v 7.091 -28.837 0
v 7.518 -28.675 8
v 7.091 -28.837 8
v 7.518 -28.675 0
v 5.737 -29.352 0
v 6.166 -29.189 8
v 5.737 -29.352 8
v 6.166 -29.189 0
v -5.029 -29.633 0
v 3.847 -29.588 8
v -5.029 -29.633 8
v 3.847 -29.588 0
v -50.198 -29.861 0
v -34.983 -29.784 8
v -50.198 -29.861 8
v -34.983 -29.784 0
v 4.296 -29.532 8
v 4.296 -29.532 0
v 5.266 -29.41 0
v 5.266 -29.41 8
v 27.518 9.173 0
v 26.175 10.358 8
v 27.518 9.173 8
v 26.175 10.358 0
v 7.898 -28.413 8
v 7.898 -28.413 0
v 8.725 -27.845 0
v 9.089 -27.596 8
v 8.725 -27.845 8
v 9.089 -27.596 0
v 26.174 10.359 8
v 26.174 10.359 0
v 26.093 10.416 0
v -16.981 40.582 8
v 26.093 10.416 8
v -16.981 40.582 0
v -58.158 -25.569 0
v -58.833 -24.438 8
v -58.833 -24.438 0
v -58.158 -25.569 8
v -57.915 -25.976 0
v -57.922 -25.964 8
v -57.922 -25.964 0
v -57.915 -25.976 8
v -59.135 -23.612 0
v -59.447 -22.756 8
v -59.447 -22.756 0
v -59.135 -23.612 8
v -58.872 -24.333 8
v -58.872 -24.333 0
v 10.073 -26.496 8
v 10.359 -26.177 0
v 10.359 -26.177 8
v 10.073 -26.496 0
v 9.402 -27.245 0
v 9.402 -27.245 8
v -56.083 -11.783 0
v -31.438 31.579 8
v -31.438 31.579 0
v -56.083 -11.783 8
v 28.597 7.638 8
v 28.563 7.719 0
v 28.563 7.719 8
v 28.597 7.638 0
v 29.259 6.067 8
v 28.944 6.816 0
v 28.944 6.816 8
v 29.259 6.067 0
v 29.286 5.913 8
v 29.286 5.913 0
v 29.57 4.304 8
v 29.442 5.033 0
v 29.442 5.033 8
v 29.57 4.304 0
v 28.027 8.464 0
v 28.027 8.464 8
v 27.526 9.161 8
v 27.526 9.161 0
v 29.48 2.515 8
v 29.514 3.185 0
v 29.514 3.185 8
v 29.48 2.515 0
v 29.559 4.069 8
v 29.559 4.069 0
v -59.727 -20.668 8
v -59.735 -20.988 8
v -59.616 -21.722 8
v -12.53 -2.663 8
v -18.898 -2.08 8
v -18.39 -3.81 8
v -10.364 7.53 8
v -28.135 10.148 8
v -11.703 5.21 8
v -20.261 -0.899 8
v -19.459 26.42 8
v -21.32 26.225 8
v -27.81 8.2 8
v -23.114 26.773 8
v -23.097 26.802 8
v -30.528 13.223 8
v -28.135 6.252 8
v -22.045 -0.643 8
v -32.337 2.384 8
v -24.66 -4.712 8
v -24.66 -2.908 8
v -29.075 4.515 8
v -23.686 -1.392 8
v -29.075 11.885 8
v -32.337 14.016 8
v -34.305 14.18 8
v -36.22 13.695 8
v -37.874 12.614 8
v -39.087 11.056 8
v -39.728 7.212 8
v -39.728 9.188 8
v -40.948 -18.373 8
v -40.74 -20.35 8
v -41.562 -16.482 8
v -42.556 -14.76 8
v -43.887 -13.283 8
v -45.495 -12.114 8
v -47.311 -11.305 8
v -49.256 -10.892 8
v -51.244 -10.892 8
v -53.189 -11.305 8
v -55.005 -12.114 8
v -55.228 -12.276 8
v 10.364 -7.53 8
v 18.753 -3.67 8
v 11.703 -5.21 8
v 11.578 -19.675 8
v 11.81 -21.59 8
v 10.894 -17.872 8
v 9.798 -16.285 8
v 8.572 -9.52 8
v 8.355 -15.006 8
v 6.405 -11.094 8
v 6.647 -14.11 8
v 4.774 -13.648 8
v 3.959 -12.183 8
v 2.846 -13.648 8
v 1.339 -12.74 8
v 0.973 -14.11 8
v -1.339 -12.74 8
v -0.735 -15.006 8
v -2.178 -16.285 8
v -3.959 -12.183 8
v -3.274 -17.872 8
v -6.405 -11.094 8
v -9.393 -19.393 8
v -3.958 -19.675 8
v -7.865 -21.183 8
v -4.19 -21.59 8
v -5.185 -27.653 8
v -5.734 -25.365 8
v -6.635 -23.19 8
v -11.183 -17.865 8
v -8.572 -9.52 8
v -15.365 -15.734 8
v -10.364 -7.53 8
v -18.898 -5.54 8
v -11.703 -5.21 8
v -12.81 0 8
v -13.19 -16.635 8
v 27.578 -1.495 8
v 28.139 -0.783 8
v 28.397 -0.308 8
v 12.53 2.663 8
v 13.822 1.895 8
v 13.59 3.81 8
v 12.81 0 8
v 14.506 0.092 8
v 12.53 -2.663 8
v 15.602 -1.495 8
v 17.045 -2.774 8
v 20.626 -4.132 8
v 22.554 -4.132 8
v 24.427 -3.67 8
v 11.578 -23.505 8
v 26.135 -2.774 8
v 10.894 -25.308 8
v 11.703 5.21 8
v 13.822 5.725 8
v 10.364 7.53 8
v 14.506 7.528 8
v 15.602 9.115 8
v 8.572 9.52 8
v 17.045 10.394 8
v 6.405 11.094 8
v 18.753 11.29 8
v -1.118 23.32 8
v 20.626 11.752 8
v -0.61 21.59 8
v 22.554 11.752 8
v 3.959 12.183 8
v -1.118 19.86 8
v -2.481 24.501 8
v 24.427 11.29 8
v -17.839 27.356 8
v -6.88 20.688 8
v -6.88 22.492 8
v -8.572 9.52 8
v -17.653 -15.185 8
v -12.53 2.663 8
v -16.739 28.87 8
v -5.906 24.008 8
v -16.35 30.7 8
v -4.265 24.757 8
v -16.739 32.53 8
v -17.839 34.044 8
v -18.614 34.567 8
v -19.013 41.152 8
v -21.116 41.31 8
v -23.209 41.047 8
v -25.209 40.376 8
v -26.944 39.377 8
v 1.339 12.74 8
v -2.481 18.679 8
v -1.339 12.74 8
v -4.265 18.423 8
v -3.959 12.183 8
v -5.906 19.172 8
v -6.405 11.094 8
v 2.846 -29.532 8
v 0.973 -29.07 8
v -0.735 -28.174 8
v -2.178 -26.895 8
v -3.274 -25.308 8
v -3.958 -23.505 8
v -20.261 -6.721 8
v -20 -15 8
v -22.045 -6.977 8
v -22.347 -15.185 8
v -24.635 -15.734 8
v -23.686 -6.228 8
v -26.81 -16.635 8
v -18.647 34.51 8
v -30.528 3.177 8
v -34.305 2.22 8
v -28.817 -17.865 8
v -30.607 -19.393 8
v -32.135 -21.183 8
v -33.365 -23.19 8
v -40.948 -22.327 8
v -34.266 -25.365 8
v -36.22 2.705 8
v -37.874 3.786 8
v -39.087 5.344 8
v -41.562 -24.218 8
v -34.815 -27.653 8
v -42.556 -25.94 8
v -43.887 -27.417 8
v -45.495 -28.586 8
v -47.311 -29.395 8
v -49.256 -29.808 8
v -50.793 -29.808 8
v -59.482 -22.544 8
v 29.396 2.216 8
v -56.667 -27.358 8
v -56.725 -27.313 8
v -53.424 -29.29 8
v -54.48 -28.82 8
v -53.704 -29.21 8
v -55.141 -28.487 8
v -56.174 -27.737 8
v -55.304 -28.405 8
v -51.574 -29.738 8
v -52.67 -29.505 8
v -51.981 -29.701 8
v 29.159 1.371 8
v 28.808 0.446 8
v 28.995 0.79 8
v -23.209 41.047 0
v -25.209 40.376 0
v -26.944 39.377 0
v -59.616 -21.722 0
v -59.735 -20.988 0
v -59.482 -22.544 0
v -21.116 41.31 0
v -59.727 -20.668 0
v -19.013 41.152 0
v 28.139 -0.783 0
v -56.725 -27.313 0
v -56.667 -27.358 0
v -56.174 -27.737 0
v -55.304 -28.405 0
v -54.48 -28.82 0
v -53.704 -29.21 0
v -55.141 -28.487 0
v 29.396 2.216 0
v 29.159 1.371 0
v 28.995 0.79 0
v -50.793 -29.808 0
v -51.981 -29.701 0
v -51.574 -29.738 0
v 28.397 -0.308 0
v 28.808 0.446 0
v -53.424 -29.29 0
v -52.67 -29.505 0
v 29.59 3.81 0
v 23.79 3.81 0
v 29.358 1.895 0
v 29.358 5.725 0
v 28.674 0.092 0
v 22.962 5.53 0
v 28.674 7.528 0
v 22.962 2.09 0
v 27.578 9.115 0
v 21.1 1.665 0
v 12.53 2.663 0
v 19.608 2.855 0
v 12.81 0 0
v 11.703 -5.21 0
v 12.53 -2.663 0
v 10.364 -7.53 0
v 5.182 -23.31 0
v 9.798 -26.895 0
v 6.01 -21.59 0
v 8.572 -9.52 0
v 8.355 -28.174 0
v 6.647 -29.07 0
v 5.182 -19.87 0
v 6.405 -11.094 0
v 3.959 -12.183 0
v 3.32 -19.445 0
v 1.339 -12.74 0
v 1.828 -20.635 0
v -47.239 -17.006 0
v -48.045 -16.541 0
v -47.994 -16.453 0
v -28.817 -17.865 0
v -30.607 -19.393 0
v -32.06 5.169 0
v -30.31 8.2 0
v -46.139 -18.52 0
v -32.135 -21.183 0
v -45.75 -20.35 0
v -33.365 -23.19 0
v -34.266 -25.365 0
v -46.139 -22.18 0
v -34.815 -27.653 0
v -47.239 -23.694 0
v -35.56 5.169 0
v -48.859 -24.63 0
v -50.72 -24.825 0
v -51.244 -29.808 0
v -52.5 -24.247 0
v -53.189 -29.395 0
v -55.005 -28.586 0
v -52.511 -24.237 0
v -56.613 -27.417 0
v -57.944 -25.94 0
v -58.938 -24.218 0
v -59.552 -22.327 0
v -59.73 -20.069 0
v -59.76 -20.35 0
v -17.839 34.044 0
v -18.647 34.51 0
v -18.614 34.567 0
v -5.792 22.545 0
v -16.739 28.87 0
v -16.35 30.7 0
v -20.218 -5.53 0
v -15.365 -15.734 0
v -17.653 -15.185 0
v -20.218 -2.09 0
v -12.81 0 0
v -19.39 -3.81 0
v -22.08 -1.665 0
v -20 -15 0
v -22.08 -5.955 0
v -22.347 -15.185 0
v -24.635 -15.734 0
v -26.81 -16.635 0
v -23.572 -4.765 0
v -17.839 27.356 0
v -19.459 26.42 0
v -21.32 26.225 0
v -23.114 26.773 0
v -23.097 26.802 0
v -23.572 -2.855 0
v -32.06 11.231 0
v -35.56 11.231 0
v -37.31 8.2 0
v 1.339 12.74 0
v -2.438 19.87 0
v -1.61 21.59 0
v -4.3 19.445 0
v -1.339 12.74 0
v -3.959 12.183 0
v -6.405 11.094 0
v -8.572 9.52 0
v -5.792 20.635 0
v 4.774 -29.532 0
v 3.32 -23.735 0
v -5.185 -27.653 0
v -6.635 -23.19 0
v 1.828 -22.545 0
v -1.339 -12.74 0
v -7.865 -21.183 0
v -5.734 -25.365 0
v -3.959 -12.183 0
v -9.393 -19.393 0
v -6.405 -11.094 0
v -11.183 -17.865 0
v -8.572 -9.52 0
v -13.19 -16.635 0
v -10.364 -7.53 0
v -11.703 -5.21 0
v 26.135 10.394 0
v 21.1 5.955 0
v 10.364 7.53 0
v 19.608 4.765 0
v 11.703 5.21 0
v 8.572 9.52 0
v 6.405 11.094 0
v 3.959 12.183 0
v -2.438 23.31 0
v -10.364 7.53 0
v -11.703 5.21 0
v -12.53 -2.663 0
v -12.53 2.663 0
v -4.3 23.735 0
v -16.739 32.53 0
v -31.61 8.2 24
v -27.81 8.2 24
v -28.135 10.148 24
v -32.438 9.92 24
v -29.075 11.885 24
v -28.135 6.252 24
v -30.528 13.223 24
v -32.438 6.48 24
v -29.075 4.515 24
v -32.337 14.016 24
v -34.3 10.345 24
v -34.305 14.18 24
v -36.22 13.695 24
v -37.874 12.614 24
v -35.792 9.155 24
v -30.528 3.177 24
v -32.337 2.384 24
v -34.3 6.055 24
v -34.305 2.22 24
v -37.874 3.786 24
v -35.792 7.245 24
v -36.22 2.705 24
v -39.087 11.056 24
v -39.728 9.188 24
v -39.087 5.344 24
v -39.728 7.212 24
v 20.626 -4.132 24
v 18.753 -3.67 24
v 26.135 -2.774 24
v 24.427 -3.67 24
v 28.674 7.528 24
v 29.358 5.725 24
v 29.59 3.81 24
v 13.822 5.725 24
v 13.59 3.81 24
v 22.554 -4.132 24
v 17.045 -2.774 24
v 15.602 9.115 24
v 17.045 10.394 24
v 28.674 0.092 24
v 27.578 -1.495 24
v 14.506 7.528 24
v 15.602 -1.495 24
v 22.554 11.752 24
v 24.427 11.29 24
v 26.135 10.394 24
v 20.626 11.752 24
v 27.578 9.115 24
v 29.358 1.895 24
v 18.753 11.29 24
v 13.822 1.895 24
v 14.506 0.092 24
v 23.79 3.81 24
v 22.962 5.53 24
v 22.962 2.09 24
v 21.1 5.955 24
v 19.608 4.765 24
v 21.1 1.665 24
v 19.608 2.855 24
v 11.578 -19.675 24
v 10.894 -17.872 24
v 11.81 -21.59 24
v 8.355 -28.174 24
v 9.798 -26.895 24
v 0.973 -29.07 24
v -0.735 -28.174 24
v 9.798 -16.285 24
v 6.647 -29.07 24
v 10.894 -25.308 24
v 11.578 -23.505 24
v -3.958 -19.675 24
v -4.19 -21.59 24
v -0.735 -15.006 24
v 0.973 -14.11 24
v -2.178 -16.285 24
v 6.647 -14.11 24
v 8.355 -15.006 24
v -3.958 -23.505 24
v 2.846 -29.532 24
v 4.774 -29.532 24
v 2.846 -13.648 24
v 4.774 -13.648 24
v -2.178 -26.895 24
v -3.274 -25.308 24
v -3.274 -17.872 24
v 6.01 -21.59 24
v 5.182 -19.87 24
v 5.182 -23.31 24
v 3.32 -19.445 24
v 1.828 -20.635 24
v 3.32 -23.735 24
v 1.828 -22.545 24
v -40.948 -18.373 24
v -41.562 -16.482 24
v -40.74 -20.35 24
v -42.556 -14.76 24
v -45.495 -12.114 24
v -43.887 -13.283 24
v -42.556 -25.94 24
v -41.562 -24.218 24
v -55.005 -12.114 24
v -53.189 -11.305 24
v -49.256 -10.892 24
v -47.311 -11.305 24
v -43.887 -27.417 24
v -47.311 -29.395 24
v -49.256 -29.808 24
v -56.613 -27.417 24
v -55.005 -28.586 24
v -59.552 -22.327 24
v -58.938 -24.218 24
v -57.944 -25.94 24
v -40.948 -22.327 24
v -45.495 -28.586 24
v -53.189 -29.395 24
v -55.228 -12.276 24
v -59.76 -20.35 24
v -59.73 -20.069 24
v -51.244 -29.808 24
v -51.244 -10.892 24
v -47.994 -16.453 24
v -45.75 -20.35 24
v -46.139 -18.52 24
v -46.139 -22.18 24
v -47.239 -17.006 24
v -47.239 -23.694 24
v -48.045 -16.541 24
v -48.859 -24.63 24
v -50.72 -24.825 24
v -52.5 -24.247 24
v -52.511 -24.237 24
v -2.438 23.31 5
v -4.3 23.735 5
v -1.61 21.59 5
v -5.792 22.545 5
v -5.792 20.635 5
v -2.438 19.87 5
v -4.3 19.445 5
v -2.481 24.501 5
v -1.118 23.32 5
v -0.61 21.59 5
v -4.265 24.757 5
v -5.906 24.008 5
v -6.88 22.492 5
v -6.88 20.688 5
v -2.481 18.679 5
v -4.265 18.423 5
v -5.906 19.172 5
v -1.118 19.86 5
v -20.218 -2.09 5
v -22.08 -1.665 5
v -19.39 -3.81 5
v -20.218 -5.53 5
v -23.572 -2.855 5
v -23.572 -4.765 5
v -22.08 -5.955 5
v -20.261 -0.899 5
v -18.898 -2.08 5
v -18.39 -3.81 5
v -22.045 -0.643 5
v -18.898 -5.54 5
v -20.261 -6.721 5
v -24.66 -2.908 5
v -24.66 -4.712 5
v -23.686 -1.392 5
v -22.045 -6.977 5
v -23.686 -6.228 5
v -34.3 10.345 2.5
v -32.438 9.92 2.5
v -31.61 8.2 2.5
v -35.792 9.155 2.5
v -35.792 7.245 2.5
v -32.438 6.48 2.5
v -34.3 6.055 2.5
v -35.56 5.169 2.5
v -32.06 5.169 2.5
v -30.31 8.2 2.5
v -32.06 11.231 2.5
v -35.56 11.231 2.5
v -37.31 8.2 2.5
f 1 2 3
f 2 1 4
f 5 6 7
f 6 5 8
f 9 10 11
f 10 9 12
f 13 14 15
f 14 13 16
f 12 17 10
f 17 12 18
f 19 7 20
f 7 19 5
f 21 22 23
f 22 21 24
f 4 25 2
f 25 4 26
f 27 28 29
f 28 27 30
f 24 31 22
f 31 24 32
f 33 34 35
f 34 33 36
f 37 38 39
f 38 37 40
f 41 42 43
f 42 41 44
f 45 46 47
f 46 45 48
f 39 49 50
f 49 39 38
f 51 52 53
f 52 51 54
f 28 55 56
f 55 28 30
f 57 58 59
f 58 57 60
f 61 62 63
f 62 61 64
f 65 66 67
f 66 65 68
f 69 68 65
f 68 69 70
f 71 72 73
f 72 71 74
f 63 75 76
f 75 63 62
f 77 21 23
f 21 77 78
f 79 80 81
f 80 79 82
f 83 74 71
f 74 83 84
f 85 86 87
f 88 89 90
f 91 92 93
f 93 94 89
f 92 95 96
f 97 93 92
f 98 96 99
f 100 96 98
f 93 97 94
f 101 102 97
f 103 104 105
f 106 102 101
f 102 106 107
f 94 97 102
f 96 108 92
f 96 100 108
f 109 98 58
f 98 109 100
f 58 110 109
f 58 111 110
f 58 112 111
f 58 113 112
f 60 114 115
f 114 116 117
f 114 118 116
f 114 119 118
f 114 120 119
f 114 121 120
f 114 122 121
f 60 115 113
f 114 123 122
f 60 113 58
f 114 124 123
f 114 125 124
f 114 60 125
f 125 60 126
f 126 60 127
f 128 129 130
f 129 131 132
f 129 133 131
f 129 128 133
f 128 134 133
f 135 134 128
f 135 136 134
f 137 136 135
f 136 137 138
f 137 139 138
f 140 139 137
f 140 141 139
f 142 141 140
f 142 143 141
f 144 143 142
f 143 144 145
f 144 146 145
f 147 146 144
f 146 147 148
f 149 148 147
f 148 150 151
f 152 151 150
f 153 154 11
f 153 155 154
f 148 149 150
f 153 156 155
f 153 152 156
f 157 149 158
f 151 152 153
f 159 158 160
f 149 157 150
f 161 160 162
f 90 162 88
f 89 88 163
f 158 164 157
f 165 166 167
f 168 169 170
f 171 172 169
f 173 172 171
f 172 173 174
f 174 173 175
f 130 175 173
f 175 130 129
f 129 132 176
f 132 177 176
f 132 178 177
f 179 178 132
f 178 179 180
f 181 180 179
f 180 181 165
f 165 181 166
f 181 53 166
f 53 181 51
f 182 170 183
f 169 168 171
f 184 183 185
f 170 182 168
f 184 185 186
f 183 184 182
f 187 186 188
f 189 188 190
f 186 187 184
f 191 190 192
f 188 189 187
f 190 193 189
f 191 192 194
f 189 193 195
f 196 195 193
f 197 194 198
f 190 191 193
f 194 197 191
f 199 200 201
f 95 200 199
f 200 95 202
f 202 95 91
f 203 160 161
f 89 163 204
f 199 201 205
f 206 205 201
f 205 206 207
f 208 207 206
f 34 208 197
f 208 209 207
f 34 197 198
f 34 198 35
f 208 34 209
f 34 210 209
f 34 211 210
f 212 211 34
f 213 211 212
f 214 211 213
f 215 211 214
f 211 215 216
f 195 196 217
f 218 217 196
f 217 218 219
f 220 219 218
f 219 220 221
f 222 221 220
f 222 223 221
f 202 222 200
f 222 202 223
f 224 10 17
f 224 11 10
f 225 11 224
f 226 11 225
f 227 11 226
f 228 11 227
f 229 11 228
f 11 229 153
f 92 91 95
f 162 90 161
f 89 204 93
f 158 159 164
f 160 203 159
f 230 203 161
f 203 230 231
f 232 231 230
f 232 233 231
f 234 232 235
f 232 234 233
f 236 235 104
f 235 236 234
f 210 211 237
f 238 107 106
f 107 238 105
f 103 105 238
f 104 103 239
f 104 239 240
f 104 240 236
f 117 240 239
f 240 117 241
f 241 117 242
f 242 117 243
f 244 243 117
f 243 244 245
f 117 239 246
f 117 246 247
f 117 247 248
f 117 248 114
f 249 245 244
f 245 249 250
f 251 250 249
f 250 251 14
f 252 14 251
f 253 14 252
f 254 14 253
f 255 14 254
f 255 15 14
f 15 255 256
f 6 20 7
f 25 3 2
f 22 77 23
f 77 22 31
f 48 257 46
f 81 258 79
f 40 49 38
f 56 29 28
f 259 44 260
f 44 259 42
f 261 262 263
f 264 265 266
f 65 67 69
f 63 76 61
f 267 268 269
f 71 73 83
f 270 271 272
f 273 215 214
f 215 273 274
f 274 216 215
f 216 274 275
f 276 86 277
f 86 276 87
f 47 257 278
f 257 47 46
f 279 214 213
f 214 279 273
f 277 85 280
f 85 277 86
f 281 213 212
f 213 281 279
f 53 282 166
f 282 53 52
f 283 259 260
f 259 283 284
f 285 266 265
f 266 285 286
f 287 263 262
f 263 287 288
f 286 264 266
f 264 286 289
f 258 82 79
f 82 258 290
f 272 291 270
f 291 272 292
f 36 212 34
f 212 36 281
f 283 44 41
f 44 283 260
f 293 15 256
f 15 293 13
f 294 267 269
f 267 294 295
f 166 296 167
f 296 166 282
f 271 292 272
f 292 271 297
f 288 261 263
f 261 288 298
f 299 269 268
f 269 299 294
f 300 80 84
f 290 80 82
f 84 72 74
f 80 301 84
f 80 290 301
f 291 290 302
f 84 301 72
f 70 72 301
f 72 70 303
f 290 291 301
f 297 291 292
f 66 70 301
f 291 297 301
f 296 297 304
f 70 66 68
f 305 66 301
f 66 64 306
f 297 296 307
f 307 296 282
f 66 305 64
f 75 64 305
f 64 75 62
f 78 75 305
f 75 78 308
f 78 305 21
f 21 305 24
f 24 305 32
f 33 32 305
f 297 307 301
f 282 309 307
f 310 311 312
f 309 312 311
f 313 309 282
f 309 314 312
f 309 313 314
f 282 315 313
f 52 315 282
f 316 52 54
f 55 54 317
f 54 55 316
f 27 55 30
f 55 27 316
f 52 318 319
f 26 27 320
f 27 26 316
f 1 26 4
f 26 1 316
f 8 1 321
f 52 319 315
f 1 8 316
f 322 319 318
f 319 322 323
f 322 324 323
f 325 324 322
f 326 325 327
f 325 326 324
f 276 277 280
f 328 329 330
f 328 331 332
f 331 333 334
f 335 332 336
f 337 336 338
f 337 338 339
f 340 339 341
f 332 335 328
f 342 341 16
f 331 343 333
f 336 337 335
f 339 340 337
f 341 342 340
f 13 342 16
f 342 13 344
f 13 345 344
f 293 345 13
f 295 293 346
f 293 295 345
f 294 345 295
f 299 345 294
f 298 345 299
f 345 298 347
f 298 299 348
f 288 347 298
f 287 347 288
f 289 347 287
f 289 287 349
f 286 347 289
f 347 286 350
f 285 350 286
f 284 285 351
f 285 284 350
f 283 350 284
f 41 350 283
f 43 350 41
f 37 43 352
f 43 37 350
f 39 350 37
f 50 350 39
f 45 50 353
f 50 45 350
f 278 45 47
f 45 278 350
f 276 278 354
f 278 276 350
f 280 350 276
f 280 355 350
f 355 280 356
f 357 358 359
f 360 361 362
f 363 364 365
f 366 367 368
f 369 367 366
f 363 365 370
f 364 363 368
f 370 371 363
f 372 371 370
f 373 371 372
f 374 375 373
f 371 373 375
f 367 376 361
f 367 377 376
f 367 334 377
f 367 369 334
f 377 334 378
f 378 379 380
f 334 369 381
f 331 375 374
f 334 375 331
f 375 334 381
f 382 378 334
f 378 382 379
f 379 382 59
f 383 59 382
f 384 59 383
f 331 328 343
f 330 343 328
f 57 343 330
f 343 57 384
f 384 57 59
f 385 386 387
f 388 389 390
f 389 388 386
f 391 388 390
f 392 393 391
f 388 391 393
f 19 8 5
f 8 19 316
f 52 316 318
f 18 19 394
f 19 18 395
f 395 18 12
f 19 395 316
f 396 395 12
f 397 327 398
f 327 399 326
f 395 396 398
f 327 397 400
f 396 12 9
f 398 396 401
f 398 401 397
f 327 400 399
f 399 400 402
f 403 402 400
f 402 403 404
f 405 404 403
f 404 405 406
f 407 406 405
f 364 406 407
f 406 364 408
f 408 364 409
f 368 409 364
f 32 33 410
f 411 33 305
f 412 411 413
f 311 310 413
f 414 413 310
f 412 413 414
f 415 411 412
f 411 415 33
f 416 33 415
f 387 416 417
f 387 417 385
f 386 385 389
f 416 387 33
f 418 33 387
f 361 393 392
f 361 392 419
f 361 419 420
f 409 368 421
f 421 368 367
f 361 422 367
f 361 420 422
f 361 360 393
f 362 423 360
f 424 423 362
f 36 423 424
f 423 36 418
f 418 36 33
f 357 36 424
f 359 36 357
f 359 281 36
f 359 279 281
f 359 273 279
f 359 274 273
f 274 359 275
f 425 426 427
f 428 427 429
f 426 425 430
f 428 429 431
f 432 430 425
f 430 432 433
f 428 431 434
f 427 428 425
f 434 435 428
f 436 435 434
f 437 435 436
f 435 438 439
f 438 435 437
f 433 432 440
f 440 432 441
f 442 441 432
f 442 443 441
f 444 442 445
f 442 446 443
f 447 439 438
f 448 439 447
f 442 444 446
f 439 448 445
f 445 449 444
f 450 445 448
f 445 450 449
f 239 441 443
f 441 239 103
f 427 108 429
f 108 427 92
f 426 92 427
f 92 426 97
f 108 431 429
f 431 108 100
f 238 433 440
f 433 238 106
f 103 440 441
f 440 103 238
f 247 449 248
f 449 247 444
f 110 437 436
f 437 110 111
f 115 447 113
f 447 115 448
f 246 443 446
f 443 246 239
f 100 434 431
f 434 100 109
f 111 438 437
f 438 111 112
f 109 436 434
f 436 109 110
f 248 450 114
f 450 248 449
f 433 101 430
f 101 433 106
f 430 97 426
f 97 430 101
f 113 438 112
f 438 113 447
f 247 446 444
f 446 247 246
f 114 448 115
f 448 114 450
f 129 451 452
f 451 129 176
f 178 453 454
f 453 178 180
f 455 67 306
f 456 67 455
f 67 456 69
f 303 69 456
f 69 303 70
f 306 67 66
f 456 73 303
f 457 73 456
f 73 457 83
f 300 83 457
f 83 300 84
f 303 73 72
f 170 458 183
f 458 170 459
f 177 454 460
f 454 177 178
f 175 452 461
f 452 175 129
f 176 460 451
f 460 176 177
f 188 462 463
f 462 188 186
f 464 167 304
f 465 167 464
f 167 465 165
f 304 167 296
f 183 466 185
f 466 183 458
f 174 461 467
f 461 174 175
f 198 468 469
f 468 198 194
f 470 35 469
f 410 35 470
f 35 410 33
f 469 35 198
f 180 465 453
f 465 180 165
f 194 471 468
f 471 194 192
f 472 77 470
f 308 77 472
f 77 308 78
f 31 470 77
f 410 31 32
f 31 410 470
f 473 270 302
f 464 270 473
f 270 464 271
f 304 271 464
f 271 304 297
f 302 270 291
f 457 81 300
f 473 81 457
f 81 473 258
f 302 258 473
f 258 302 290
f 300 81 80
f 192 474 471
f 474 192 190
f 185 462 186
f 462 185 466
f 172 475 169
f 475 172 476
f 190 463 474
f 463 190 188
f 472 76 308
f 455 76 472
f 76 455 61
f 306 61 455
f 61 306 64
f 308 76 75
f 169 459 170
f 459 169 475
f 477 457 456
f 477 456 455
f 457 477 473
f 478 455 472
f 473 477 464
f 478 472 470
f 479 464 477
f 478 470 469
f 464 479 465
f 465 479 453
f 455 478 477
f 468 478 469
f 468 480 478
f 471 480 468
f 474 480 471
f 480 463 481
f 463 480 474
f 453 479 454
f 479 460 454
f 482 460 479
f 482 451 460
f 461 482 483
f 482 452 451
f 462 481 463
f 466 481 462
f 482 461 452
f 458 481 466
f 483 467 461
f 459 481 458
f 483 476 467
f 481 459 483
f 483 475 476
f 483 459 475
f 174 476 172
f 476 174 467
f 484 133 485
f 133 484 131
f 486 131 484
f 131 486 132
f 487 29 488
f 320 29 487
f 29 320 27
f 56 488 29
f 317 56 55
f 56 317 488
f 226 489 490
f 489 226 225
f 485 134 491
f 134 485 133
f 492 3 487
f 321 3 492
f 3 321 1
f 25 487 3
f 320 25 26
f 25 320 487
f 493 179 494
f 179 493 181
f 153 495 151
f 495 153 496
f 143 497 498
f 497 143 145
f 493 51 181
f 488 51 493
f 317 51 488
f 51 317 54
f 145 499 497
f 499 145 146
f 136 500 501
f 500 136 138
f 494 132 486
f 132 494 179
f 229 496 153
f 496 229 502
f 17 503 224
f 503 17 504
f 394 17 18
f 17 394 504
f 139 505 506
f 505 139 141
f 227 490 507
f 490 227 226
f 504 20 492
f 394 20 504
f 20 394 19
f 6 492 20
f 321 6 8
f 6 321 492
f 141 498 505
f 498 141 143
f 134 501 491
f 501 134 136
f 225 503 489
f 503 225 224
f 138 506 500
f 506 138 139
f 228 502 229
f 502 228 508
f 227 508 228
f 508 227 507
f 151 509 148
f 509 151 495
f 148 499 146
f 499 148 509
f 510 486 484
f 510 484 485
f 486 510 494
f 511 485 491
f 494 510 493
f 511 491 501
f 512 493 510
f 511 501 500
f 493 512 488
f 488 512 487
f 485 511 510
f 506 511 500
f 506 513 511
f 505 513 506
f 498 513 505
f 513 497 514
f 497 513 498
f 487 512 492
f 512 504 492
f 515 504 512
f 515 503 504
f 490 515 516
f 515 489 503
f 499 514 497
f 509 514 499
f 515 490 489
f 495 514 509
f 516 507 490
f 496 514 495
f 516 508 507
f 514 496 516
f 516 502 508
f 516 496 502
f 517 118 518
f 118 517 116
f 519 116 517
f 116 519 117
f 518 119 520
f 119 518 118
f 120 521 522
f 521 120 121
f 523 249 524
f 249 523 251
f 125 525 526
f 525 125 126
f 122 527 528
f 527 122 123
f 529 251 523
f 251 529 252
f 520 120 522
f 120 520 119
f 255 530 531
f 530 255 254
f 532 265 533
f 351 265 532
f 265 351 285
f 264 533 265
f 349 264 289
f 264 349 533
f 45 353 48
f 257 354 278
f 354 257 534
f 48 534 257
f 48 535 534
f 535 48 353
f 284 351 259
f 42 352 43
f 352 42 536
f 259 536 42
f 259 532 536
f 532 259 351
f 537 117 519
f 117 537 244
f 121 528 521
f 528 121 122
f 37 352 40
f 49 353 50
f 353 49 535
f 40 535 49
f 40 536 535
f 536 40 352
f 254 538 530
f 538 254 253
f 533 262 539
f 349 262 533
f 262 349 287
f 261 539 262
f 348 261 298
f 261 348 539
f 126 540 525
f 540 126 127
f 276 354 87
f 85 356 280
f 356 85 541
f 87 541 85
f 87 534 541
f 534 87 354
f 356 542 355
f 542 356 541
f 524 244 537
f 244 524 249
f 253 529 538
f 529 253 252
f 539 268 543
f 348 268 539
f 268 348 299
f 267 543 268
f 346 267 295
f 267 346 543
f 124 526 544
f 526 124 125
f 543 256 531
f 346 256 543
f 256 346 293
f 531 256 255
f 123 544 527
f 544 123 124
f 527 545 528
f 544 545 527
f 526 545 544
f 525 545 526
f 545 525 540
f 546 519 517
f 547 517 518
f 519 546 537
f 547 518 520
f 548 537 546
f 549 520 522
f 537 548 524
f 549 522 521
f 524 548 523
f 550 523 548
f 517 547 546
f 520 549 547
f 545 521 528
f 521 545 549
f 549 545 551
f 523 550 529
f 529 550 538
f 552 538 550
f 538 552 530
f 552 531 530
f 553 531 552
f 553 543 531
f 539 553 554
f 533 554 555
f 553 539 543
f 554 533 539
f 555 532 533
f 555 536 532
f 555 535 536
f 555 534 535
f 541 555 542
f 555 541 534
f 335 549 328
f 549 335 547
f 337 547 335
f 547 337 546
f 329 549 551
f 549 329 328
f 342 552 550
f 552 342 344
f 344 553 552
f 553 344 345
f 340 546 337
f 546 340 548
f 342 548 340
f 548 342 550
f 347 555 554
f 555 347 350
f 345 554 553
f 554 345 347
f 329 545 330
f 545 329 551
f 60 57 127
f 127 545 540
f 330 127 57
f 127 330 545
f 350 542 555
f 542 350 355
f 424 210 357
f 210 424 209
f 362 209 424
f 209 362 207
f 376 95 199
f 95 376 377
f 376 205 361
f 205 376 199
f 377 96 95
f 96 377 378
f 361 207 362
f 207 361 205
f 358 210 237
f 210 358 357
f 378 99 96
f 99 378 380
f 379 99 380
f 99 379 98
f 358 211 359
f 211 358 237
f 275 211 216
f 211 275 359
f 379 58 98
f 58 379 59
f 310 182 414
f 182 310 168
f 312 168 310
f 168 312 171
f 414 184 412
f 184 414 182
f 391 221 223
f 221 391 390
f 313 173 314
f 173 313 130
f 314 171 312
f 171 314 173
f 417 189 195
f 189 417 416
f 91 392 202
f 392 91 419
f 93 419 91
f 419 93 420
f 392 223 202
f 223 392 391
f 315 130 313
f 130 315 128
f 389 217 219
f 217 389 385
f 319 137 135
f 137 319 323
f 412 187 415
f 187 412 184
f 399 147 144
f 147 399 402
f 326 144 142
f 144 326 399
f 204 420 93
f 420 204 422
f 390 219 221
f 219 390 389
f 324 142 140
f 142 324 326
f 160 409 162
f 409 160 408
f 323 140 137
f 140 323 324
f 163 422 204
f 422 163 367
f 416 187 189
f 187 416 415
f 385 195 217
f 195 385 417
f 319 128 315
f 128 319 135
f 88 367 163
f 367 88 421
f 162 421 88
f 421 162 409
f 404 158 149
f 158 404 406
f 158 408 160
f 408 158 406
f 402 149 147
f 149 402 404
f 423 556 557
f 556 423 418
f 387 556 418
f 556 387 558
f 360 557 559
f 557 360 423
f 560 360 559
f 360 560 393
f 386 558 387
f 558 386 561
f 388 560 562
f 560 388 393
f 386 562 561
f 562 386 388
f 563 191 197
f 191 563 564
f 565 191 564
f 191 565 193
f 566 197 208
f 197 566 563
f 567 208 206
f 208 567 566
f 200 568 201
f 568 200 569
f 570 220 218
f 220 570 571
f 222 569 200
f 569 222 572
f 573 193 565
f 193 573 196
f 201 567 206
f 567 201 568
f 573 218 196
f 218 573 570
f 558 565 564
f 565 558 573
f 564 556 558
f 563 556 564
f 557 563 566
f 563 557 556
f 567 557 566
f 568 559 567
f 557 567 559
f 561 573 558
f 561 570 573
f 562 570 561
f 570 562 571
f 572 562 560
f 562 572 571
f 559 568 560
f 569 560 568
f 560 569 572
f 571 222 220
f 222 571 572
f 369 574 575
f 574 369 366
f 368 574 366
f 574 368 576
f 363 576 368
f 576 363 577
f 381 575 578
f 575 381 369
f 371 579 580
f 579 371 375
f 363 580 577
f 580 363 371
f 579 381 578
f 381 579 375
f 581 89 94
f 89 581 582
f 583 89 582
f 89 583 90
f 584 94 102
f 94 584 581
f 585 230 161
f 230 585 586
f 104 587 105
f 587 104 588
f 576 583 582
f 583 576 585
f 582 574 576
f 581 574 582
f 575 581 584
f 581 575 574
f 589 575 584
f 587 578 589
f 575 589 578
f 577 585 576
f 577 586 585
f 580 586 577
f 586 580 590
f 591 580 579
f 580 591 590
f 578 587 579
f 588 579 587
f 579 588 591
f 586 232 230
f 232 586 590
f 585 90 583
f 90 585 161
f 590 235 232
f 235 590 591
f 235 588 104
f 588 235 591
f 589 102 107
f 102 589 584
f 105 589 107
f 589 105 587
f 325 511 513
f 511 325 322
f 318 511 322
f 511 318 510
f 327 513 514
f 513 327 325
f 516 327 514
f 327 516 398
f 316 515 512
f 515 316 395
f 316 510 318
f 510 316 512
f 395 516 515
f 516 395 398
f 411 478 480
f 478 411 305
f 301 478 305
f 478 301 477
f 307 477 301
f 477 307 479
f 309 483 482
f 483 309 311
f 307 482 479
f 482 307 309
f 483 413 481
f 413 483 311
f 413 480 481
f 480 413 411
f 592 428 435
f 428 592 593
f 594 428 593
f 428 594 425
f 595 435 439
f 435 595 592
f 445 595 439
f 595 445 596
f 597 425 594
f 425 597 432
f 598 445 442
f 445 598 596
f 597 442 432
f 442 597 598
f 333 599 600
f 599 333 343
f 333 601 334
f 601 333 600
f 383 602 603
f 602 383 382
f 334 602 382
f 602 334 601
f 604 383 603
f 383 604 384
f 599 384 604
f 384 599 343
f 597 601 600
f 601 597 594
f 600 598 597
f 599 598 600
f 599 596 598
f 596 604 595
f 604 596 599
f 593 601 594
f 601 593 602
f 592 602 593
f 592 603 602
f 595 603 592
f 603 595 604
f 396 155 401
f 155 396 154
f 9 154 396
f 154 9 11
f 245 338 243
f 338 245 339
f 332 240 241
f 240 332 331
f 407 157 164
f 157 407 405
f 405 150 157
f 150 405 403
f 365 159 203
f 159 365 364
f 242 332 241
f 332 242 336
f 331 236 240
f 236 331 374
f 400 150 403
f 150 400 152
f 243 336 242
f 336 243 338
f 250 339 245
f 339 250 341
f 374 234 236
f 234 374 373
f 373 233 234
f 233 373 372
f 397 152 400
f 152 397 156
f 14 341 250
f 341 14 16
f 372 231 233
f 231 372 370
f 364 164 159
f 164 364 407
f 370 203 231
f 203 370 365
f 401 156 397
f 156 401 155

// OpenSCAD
// file: functions.scad
// PRUSA Mendel  
// Functions used in many files
// GNU GPL v3
// Josef Průša
// josefprusa@me.com
// prusadjs.cz
// http://www.reprap.org/wiki/Prusa_Mendel
// http://github.com/prusajr/PrusaMendel


module nut(d,h,horizontal=true){
cornerdiameter =  (d / 2) / cos (180 / 6);
cylinder(h = h, r = cornerdiameter, $fn = 6);
if(horizontal){
for(i = [1:6]){
	rotate([0,0,60*i]) translate([-cornerdiameter-0.2,0,0]) rotate([0,0,-45]) cube(size = [2,2,h]);
}}
}

// Based on nophead research
module polyhole(d,h) {
    n = max(round(2 * d),3);
    rotate([0,0,180])
        cylinder(h = h, r = (d / 2) / cos (180 / n), $fn = n);
}




module roundcorner(diameter){
	difference(){
		cube(size = [diameter,diameter,99], center = false);
		translate(v = [diameter, diameter, 0]) cylinder(h = 100, r=diameter, center=false,$fn = max(3*diameter,20));
	}
}
// file: configuration.scad
// PRUSA Mendel  
// Configuration file
// GNU GPL v2
// Josef Pra
// josefprusa@me.com
// prusadjs.cz
// http://www.reprap.org/wiki/Prusa_Mendel
// http://github.com/prusajr/PrusaMendel


// PLEASE SELECT ONE OF THE CONFIGURATIONS BELOW
// BY UN-COMMENTING IT


variant=0; //0 for metric
//variant=1; //1 for SAE
if(variant==0){
echo("variant: metric");
}else if(variant==1){
echo("variant: sae");
} else{
echo("WARNING: INVALID CONFIGURATION");
}




vars=[
//[m8_dia,m8_nut, m4_dia, m4_nut, m3_dia, m3_nut, bush_dia, mot_shaft, bush_rod, bush_outerdia, bush_length, m5_dia, m5_nut]
[9, 16.4, 5,9, 4.4, 7, 11, 5.3, 8, 16, 11, 5.6, 10],//metric
[9,15.7,5.5,10.6,5.5,10.6,11.5,5.3,7.9375,16,11,5.6, 10]//SAE
];


//BUSHING TYPE Can generate three versions
// 1 - regular old ones
// 2 - helical ones
// 3 - holders for brass or any other bought bushings
bushing_type = 2;


//Round corner diameter
round_corner_diameter = 8;


//Thin wall size
layer_height = 0.4;
perimeter_width_over_thicknes = 1.6;
infill_widht_over_thickness = 1.55;
thin_wall = 2*(perimeter_width_over_thicknes*layer_height+infill_widht_over_thickness*layer_height);
if(thin_wall<2){
	echo("Check thin wall size, its below 2mm!");
}
echo(thin_wall);


//DO NOT TOUCH THIS SECTION!
m8_diameter = vars[variant][0];
m8_nut_diameter = vars[variant][1];
m4_diameter = vars[variant][2];
m4_nut_diameter = vars[variant][3];
m3_diameter = vars[variant][4];
m3_nut_diameter = vars[variant][5];
bushing_diameter = vars[variant][6];
motor_shaft=vars[variant][7];
bushing_rodsize = vars[variant][8];
bushing_outerDiameter = vars[variant][9];
bushing_lenght = vars[variant][10];
m5_diameter = vars[variant][11];
m5_nut_diameter = vars[variant][12];



// MINI-HUXLEY VERSION (TODO, just place holder)
// include <configuration-huxley.scad>


// MEGA VERSION (TODO, just place holder)
// include <configuration-mega.scad>




// Some basic functions, probably should be somewhere else
module roundcorner(diameter){
	difference(){
		cube(size = [diameter,diameter,99], center = false);
		translate(v = [diameter, diameter, 0]) cylinder(h = 100, r=diameter, center=true);
	}
}

include <functions.scad>
// main file
/*
Released by Lanthan, august 24, 2011, under the GNU Public licens (GPL).
*/

// Modified by Adrian to reduce material

// Print one of the objects generated when this is true, and one when it's false.
motor_side=true;

include <configuration.scad> ;

mount_thickness = 8 ;
cover_thickness = 7 ;
cyl_height = 24 ;


module motor_mount() {
difference() {
union() {
	linear_extrude(file="../dxf/ybracproj_extr.dxf", height = mount_thickness, origin =[0,0]);
	translate([-33.81,8.20,0]) cylinder(h=cyl_height, r=6) ;
	translate([21.59,3.81,0]) cylinder(h=cyl_height, r=8) ;
	translate([3.81,-21.59,0]) cylinder(h=cyl_height, r=8) ;
	translate([-50.25,-20.35,0]) cylinder(h=cyl_height, r=9.51) ;

}
translate([0,0,-5]) cylinder(h=50,r=12.81) ;
translate([-3.81,21.59,-5]) cylinder(h=50,r=m3_diameter/2) ;
translate([-3.81,21.59,5]) cylinder(h=50,r=3.2) ;
translate([-21.59,-3.81,-5]) cylinder(h=50,r=m3_diameter/2) ;
translate([-21.59,-3.81,5]) cylinder(h=50,r=3.2) ;
translate([3.81,-21.59,-5]) cylinder(h=50,r=m3_diameter/2) ;
translate([21.59,3.81,-5]) cylinder(h=50,r=m3_diameter/2) ;
translate([-33.81,8.20,-5]) cylinder(h=50,r=m3_diameter/2) ;
translate([-33.81,8.20,-5]) cylinder(h=7.5,r=m3_nut_diameter/2, $fn=6) ;

union() {
translate([-50.25,-20.35,-5]) cylinder(h=30,r=4.50) ;
translate([-55.44,-17.35,10]) rotate(a=[0,0,-30]) cube(size = [12,9,30], center = true) ;
}

union() {
translate([-20.85,30.70,-5]) cylinder(h=30,r=4.50) ;
translate([-26.06,33.67,10]) rotate(a=[0,0,-30]) cube(size = [12,9,30], center = true) ;
}

translate([-20,-30,-5]) cylinder(h=30,r=15, center=true, $fn=40) ;
}

} ; // end motor_mount

module mount_cover() {

difference() {

union() {
	linear_extrude(file="../dxf/ybracproj_extr.dxf", height = cover_thickness, origin =[0,0]);

//cylinder(h=10,r=17) ;

}
translate([0,0,-1.5]) cylinder(h=50,r=15) ;
//translate([0,0,-5]) cylinder(h=50,r=8) ;
translate([-20,-30,-5]) cylinder(h=30,r=15, center=true, $fn=40) ;
translate([3.81,-21.59,-5]) cylinder(h=50,r=m3_diameter/2) ;
translate([21.59,3.81,-5]) cylinder(h=50,r=m3_diameter/2) ;
translate([-33.81,8.20,-5]) cylinder(h=50,r=m3_diameter/2) ;

union() {
translate([-50.25,-20.35,-5]) cylinder(h=30,r=4.50) ;
translate([-55.44,-17.35,10]) rotate(a=[0,0,-30]) cube(size = [12,9,30], center = true) ;
}

union() {
translate([-20.85,30.70,-5]) cylinder(h=30,r=4.50) ;
translate([-26.06,33.67,10]) rotate(a=[0,0,-30]) cube(size = [12,9,30], center = true) ;
}




}

} ; // end mount_cover


if(motor_side)
	motor_mount() ;
else
	mount_cover() ;
